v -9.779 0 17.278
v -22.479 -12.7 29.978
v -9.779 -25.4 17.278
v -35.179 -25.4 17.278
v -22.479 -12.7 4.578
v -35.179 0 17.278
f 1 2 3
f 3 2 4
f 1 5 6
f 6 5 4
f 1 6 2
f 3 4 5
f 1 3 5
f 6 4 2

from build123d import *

# Parameters (mm, degrees)
F0_W     = 25.4
F0_H     = 25.4
F1_DEPTH = 25.4
F4_DEPTH = 25.4
F5_DEPTH = 25.4


with BuildPart() as f1:
    # F0 (on Front) → F1 (new body)
    with BuildSketch(Plane.XZ):
        with Locations((-22.479386, 17.278457)):
            Rectangle(F0_W, F0_H)
    extrude(amount=F1_DEPTH)

    # F3 (on face) → F4 (cut)
    with BuildSketch(Plane(origin=(-35.179386, 0, 0), x_dir=(0, -1, 0), z_dir=(-1, 0, 0))):
        Polygon((25.4, 29.978457), (12.7, 29.978457), (25.4, 17.278457), align=None)
        Polygon((0, 17.278457), (12.7, 29.978457), (0, 29.978457), align=None)
        Polygon((12.7, 4.578457), (0, 17.278457), (0, 4.578457), align=None)
        Polygon((25.4, 4.578457), (25.4, 17.278457), (12.7, 4.578457), align=None)
    extrude(amount=-F4_DEPTH, mode=Mode.SUBTRACT)

    # F2 (on face) → F5 (cut)
    with BuildSketch(Plane.XZ.offset(25.4)):
        Polygon((-9.779386, 29.978457), (-22.479386, 29.978457), (-9.779386, 17.278457), align=None)
        Polygon((-9.779386, 4.578457), (-9.779386, 17.278457), (-22.479386, 4.578457), align=None)
        Polygon((-22.479386, 4.578457), (-35.179386, 17.278457), (-35.179386, 4.578457), align=None)
        Polygon((-35.179386, 17.278457), (-22.479386, 29.978457), (-35.179386, 29.978457), align=None)
    extrude(amount=-F5_DEPTH, mode=Mode.SUBTRACT)


solid = f1.part
